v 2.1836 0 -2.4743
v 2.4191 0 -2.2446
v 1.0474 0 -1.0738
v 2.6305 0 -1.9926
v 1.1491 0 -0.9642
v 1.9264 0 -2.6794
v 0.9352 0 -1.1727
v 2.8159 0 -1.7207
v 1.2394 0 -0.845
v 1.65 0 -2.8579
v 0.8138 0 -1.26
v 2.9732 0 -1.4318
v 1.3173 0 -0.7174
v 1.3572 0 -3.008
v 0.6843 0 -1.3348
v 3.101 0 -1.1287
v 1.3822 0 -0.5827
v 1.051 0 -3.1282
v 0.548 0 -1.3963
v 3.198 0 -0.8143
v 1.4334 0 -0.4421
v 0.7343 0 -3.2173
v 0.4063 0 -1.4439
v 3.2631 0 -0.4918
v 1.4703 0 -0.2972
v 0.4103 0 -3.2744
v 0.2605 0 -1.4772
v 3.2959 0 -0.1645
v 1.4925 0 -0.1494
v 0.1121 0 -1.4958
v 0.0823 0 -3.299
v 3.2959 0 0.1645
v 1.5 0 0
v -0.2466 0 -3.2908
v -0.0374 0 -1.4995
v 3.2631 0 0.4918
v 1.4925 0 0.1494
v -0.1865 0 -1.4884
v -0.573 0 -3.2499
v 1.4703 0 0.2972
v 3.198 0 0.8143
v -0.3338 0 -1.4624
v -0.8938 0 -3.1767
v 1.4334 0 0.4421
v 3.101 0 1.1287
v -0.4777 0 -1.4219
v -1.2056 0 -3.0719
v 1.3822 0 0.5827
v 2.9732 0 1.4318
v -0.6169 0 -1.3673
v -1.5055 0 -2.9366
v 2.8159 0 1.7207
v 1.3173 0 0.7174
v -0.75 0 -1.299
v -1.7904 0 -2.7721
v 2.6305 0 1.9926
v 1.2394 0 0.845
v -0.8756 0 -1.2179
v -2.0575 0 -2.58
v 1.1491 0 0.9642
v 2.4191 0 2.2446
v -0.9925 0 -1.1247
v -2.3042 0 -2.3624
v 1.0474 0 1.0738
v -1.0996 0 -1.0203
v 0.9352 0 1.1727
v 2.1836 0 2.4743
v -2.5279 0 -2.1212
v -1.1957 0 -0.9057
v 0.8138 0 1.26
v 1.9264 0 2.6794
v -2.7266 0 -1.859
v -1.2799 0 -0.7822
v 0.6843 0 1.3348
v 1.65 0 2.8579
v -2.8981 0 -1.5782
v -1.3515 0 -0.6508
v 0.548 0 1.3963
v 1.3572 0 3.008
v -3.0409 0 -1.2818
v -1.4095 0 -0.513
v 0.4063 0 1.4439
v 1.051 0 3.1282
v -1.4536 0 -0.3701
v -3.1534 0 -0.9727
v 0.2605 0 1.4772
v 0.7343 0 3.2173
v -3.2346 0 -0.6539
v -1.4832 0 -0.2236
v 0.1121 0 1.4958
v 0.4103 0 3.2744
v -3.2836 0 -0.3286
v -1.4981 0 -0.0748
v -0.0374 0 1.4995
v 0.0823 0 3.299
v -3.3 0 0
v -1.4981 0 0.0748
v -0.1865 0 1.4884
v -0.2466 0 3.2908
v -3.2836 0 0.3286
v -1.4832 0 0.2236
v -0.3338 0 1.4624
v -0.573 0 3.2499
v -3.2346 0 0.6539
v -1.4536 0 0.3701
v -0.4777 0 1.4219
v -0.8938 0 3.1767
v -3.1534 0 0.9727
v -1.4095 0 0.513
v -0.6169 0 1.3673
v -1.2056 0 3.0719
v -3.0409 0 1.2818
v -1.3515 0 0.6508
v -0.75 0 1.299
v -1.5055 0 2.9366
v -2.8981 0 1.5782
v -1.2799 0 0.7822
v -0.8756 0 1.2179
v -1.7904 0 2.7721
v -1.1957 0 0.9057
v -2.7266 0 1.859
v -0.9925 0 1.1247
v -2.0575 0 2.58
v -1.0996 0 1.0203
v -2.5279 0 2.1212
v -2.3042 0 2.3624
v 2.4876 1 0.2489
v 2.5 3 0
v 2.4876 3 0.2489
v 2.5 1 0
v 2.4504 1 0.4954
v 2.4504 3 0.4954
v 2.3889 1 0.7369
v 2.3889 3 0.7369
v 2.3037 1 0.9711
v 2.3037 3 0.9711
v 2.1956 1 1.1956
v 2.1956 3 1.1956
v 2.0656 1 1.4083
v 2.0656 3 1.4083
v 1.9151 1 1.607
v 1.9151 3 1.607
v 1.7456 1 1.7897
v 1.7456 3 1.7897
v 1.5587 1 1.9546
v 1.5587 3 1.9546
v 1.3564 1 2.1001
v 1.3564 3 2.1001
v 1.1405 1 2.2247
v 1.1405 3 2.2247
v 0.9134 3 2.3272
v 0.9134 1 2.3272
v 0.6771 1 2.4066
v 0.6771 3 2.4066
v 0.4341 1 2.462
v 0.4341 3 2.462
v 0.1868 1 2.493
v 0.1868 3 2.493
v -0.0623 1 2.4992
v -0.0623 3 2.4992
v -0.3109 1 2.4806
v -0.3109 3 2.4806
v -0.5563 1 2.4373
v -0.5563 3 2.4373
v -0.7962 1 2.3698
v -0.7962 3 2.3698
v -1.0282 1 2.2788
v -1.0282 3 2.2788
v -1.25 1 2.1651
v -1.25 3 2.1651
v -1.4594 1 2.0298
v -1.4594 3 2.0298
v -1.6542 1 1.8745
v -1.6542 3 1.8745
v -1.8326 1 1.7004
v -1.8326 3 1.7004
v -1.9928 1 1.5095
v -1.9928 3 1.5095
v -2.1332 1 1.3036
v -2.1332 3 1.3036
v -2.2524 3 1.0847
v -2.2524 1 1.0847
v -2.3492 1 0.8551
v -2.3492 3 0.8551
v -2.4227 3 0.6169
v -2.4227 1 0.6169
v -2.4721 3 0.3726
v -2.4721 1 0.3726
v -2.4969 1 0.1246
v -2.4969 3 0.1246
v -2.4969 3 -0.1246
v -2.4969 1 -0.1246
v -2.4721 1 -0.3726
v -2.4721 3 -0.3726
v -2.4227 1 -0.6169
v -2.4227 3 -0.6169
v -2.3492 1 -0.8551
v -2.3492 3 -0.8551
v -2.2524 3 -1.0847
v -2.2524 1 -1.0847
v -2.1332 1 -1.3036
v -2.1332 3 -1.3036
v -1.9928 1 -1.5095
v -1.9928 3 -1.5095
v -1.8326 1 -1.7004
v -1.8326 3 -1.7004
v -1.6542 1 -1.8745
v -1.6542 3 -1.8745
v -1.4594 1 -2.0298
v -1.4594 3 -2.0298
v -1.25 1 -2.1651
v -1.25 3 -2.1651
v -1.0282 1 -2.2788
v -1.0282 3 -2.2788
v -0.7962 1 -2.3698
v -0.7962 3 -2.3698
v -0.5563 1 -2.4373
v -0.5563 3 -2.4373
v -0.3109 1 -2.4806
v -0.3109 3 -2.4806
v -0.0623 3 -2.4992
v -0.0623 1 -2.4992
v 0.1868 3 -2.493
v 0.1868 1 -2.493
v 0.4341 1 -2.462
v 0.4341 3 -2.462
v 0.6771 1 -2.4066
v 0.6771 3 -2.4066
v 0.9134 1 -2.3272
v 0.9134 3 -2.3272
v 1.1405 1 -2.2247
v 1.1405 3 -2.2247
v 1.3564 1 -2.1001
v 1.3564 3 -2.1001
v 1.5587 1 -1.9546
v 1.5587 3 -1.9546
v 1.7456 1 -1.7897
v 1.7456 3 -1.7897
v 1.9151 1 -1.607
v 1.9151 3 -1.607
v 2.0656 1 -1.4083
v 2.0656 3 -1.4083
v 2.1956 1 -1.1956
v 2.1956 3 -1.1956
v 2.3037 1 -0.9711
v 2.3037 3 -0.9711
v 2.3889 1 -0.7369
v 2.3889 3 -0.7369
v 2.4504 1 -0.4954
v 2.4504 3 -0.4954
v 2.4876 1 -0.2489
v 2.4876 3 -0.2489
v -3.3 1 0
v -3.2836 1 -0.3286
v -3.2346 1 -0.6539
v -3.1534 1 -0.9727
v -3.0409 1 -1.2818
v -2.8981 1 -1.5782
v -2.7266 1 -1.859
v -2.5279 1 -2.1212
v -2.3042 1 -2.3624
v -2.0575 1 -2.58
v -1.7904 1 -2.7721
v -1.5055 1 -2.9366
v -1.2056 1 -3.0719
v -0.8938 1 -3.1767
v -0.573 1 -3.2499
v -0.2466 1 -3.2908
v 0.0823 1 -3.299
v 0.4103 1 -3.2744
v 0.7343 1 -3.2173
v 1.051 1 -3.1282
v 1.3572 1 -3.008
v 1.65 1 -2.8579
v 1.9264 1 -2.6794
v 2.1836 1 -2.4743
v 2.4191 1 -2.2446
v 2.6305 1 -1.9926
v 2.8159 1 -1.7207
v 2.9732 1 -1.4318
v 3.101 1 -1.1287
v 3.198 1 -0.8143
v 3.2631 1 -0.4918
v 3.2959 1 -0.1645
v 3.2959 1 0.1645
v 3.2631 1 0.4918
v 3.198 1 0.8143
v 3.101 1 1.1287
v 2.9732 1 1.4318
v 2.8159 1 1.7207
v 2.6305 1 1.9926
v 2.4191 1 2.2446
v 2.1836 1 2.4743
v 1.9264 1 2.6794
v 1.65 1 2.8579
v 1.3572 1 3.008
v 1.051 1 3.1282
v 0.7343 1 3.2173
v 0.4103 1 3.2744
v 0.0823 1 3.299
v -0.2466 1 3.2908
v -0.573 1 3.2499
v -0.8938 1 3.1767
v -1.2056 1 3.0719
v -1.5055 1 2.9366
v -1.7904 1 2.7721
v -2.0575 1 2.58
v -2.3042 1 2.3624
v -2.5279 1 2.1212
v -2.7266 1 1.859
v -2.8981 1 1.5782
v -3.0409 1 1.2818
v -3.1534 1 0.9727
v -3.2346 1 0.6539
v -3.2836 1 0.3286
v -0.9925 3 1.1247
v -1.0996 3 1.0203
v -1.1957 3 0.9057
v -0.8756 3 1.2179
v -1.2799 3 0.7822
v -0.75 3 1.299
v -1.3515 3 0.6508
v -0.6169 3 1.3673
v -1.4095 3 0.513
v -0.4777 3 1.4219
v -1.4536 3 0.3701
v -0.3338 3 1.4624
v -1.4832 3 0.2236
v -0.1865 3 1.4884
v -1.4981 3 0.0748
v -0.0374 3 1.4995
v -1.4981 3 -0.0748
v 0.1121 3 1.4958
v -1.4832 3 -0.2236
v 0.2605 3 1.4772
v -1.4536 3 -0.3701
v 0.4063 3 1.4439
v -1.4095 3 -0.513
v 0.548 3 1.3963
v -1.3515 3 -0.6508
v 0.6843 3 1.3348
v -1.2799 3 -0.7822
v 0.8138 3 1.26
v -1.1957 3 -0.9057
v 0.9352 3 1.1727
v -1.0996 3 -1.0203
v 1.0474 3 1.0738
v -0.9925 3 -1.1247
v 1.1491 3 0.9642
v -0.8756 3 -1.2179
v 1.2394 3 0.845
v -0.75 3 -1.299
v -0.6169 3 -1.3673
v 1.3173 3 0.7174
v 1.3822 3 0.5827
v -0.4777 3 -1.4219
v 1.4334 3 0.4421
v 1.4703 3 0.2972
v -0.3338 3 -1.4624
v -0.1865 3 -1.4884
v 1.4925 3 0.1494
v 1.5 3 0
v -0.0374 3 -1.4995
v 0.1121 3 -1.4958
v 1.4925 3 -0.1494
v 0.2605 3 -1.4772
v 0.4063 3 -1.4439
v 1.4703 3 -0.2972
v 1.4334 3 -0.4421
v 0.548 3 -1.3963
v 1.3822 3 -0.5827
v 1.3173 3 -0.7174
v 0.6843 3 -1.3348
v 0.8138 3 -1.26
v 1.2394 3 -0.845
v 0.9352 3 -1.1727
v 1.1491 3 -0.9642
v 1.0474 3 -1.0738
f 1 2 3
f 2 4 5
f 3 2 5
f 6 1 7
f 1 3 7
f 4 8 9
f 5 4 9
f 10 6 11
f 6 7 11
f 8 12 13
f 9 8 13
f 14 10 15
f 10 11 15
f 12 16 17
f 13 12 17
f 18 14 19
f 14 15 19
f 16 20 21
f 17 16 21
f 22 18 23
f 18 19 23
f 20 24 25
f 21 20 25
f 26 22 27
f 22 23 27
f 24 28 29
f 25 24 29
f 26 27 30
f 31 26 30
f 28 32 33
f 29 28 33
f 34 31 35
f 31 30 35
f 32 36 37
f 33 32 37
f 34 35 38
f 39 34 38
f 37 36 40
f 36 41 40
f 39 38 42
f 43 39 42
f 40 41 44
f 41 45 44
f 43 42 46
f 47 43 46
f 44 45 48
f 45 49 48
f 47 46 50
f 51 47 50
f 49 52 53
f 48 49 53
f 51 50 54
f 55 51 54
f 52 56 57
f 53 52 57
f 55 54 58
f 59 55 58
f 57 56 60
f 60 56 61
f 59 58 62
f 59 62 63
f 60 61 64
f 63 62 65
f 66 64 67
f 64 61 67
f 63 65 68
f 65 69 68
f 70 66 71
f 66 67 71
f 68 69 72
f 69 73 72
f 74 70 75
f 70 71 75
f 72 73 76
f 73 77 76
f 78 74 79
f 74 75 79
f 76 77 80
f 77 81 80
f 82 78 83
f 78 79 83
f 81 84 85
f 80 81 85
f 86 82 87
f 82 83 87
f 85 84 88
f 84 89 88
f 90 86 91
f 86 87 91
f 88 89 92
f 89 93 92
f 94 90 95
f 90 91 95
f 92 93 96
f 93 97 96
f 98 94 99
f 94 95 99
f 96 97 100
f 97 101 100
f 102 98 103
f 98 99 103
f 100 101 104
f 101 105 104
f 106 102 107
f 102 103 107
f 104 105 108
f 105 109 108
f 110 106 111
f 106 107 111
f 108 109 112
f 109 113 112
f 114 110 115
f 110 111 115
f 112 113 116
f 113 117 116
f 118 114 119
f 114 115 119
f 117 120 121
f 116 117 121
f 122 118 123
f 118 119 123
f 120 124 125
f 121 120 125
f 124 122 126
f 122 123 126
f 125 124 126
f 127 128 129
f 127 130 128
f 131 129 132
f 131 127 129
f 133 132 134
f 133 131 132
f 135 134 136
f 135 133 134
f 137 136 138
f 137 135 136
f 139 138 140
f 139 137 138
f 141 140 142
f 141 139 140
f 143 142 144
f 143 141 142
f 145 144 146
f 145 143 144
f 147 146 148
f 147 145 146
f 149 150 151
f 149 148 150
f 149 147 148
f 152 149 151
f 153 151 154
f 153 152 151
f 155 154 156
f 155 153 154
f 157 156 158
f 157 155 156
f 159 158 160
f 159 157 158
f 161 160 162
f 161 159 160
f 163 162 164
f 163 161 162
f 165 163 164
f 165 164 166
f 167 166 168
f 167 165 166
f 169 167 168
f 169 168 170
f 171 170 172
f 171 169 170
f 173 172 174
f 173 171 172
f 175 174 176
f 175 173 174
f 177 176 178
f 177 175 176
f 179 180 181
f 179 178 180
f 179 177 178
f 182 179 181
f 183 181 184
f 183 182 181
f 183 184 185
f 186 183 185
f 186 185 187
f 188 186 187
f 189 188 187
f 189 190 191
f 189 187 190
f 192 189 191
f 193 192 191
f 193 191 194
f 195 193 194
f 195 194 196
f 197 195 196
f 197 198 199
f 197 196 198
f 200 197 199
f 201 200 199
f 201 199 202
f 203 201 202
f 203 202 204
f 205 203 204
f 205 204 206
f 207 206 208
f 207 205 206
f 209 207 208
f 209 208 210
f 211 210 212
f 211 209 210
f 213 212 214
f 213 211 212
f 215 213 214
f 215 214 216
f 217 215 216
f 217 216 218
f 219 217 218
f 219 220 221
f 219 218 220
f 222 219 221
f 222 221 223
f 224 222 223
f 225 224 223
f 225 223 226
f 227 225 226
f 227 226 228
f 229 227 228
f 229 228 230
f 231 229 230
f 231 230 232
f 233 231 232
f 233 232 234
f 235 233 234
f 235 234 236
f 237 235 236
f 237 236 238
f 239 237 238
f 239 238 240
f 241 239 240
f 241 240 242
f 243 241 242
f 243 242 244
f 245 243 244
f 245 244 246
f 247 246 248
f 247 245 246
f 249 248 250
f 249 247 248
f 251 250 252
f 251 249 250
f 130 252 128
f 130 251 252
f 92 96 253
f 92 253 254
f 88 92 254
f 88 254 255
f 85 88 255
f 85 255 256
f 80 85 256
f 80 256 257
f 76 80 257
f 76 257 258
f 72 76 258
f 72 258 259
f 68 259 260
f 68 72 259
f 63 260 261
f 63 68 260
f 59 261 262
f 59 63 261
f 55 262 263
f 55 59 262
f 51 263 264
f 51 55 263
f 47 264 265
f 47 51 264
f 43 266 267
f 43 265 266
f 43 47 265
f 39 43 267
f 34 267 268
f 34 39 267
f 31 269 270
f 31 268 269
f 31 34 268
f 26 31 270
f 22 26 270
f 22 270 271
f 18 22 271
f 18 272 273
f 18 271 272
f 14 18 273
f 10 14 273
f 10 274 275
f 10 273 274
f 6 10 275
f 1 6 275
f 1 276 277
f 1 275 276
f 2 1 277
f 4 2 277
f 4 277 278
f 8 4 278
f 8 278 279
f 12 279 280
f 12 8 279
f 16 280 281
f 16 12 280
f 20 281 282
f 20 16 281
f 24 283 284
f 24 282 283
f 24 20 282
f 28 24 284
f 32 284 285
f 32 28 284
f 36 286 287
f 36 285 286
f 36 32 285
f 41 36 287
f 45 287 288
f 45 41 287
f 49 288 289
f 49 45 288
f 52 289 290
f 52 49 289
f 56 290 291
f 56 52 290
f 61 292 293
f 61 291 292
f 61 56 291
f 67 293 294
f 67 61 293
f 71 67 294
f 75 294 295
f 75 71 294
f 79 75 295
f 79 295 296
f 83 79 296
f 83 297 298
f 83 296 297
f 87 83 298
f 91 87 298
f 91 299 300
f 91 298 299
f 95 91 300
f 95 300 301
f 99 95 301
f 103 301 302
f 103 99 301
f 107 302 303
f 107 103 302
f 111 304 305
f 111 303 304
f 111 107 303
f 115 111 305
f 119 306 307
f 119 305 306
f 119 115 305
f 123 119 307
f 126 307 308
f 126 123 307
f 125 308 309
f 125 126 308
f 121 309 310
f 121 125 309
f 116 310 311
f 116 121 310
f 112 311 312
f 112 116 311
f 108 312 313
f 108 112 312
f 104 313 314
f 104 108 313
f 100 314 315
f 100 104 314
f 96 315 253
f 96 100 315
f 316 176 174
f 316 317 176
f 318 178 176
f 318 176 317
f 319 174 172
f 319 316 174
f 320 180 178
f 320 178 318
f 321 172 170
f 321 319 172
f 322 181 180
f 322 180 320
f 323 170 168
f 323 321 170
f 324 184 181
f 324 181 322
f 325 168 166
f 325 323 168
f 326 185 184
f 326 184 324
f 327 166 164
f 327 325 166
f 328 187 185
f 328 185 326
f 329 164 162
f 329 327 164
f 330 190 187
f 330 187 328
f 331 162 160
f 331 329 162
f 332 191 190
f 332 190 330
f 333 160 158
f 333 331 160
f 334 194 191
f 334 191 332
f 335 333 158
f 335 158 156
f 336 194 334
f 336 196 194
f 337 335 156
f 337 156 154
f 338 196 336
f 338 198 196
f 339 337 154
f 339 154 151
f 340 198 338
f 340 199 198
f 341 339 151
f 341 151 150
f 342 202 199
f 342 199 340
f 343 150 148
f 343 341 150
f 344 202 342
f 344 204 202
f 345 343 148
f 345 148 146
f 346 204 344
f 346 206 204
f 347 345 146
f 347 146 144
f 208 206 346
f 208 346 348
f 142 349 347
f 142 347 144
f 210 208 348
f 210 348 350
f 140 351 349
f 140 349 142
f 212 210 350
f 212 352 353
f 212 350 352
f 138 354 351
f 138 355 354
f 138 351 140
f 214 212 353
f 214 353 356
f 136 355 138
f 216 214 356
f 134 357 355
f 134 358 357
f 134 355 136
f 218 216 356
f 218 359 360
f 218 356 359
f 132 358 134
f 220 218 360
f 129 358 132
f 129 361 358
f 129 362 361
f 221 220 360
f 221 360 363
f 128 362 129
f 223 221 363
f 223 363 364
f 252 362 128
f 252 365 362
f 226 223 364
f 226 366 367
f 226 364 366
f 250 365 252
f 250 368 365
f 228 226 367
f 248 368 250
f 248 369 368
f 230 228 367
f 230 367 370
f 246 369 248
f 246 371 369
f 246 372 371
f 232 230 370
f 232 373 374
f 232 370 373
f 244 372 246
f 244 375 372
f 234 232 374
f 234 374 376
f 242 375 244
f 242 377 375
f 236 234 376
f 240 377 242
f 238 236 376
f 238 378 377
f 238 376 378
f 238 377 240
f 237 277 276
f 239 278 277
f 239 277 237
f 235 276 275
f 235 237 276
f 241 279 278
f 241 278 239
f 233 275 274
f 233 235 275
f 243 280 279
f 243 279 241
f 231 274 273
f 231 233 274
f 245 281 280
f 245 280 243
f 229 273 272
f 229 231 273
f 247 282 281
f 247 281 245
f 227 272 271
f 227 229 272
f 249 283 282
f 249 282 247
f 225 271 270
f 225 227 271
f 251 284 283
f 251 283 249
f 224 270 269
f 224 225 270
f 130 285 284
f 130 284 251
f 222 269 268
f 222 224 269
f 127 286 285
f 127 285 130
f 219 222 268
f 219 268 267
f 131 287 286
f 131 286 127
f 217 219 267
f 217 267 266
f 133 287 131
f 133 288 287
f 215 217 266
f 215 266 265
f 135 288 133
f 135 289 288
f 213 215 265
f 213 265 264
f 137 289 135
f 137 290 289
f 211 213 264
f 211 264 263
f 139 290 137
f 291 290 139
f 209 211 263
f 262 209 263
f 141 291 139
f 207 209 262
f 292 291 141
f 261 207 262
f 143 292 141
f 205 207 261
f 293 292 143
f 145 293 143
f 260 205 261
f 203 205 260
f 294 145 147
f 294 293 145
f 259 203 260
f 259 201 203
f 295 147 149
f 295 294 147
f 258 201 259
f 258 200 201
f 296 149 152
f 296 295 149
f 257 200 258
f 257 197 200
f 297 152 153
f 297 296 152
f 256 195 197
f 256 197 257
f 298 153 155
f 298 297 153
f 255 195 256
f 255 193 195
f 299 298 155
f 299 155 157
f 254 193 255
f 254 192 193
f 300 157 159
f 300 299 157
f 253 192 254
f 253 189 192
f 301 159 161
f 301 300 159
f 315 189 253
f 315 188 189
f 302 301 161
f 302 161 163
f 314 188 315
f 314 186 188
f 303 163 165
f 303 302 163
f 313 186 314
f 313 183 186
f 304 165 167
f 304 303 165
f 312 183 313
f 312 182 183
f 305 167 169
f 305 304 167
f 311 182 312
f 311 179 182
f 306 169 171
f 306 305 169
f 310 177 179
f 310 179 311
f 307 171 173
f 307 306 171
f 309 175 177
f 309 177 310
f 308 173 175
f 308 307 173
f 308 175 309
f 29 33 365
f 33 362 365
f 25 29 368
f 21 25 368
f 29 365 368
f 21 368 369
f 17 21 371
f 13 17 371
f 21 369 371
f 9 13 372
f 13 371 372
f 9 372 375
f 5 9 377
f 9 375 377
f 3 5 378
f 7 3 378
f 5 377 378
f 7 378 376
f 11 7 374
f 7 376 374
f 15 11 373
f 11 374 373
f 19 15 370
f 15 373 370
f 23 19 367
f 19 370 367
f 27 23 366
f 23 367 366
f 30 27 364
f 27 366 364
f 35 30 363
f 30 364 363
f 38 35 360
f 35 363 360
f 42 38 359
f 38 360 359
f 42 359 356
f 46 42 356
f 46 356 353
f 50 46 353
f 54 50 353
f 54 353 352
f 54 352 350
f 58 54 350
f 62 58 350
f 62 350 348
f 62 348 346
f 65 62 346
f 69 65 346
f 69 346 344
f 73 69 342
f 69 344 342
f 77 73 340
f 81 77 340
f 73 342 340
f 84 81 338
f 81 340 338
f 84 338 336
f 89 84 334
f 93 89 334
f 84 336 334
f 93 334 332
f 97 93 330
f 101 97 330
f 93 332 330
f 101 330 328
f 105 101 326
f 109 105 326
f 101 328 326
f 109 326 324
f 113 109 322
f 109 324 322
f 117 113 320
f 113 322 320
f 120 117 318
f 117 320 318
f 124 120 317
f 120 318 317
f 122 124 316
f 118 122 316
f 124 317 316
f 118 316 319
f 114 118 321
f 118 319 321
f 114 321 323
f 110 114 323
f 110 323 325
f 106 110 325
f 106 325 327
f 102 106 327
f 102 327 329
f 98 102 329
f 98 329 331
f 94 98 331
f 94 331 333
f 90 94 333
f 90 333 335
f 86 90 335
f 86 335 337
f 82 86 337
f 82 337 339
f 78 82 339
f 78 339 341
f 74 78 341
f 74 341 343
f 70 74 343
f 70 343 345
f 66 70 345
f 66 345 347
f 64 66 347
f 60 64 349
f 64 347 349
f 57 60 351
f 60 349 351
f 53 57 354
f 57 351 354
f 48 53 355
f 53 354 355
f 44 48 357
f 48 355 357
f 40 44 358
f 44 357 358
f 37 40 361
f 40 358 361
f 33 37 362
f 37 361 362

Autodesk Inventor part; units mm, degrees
ref_plane "YZ Plane" through (0, 0, 0) normal (1, 0, 0) x (0, 1, 0)
ref_plane "XZ Plane" through (0, 0, 0) normal (0, 1, 0) x (-1, 0, 0)
ref_plane "XY Plane" through (0, 0, 0) normal (0, 0, 1) x (1, 0, 0)
sketch "Sketch1" plane through (0, 0, 0) normal (0, 1, 0) x (-1, 0, 0)
  circle A0 centre (0, 0) radius 3.3
  dimension "d0" = 6.6
extrude "Extrusion1" add sketch "Sketch1" along normal blind 1
sketch "Sketch2" plane through (0, 1, 0) normal (0, 1, 0) x (1, 0, 0)
  point P0 (0, 0)
sketch "Sketch3" plane through (0, 1, 0) normal (0, 1, 0) x (1, 0, 0)
  circle A0 centre (0, 0) radius 2.5
  dimension "d3" = 5
extrude "Extrusion2" add sketch "Sketch3" along normal blind 2
sketch "Sketch4" plane through (0, 3, 0) normal (0, 1, 0) x (1, 0, 0)
  circle A0 centre (0, 0) radius 1.5
  dimension "d6" = 3
extrude "Extrusion3" cut sketch "Sketch4" against normal blind 3
thread "Thread1" size "M3x0.5" class "6H" standard "ANSI Metric M Profile" full length
properties part number "HAND_persely"
